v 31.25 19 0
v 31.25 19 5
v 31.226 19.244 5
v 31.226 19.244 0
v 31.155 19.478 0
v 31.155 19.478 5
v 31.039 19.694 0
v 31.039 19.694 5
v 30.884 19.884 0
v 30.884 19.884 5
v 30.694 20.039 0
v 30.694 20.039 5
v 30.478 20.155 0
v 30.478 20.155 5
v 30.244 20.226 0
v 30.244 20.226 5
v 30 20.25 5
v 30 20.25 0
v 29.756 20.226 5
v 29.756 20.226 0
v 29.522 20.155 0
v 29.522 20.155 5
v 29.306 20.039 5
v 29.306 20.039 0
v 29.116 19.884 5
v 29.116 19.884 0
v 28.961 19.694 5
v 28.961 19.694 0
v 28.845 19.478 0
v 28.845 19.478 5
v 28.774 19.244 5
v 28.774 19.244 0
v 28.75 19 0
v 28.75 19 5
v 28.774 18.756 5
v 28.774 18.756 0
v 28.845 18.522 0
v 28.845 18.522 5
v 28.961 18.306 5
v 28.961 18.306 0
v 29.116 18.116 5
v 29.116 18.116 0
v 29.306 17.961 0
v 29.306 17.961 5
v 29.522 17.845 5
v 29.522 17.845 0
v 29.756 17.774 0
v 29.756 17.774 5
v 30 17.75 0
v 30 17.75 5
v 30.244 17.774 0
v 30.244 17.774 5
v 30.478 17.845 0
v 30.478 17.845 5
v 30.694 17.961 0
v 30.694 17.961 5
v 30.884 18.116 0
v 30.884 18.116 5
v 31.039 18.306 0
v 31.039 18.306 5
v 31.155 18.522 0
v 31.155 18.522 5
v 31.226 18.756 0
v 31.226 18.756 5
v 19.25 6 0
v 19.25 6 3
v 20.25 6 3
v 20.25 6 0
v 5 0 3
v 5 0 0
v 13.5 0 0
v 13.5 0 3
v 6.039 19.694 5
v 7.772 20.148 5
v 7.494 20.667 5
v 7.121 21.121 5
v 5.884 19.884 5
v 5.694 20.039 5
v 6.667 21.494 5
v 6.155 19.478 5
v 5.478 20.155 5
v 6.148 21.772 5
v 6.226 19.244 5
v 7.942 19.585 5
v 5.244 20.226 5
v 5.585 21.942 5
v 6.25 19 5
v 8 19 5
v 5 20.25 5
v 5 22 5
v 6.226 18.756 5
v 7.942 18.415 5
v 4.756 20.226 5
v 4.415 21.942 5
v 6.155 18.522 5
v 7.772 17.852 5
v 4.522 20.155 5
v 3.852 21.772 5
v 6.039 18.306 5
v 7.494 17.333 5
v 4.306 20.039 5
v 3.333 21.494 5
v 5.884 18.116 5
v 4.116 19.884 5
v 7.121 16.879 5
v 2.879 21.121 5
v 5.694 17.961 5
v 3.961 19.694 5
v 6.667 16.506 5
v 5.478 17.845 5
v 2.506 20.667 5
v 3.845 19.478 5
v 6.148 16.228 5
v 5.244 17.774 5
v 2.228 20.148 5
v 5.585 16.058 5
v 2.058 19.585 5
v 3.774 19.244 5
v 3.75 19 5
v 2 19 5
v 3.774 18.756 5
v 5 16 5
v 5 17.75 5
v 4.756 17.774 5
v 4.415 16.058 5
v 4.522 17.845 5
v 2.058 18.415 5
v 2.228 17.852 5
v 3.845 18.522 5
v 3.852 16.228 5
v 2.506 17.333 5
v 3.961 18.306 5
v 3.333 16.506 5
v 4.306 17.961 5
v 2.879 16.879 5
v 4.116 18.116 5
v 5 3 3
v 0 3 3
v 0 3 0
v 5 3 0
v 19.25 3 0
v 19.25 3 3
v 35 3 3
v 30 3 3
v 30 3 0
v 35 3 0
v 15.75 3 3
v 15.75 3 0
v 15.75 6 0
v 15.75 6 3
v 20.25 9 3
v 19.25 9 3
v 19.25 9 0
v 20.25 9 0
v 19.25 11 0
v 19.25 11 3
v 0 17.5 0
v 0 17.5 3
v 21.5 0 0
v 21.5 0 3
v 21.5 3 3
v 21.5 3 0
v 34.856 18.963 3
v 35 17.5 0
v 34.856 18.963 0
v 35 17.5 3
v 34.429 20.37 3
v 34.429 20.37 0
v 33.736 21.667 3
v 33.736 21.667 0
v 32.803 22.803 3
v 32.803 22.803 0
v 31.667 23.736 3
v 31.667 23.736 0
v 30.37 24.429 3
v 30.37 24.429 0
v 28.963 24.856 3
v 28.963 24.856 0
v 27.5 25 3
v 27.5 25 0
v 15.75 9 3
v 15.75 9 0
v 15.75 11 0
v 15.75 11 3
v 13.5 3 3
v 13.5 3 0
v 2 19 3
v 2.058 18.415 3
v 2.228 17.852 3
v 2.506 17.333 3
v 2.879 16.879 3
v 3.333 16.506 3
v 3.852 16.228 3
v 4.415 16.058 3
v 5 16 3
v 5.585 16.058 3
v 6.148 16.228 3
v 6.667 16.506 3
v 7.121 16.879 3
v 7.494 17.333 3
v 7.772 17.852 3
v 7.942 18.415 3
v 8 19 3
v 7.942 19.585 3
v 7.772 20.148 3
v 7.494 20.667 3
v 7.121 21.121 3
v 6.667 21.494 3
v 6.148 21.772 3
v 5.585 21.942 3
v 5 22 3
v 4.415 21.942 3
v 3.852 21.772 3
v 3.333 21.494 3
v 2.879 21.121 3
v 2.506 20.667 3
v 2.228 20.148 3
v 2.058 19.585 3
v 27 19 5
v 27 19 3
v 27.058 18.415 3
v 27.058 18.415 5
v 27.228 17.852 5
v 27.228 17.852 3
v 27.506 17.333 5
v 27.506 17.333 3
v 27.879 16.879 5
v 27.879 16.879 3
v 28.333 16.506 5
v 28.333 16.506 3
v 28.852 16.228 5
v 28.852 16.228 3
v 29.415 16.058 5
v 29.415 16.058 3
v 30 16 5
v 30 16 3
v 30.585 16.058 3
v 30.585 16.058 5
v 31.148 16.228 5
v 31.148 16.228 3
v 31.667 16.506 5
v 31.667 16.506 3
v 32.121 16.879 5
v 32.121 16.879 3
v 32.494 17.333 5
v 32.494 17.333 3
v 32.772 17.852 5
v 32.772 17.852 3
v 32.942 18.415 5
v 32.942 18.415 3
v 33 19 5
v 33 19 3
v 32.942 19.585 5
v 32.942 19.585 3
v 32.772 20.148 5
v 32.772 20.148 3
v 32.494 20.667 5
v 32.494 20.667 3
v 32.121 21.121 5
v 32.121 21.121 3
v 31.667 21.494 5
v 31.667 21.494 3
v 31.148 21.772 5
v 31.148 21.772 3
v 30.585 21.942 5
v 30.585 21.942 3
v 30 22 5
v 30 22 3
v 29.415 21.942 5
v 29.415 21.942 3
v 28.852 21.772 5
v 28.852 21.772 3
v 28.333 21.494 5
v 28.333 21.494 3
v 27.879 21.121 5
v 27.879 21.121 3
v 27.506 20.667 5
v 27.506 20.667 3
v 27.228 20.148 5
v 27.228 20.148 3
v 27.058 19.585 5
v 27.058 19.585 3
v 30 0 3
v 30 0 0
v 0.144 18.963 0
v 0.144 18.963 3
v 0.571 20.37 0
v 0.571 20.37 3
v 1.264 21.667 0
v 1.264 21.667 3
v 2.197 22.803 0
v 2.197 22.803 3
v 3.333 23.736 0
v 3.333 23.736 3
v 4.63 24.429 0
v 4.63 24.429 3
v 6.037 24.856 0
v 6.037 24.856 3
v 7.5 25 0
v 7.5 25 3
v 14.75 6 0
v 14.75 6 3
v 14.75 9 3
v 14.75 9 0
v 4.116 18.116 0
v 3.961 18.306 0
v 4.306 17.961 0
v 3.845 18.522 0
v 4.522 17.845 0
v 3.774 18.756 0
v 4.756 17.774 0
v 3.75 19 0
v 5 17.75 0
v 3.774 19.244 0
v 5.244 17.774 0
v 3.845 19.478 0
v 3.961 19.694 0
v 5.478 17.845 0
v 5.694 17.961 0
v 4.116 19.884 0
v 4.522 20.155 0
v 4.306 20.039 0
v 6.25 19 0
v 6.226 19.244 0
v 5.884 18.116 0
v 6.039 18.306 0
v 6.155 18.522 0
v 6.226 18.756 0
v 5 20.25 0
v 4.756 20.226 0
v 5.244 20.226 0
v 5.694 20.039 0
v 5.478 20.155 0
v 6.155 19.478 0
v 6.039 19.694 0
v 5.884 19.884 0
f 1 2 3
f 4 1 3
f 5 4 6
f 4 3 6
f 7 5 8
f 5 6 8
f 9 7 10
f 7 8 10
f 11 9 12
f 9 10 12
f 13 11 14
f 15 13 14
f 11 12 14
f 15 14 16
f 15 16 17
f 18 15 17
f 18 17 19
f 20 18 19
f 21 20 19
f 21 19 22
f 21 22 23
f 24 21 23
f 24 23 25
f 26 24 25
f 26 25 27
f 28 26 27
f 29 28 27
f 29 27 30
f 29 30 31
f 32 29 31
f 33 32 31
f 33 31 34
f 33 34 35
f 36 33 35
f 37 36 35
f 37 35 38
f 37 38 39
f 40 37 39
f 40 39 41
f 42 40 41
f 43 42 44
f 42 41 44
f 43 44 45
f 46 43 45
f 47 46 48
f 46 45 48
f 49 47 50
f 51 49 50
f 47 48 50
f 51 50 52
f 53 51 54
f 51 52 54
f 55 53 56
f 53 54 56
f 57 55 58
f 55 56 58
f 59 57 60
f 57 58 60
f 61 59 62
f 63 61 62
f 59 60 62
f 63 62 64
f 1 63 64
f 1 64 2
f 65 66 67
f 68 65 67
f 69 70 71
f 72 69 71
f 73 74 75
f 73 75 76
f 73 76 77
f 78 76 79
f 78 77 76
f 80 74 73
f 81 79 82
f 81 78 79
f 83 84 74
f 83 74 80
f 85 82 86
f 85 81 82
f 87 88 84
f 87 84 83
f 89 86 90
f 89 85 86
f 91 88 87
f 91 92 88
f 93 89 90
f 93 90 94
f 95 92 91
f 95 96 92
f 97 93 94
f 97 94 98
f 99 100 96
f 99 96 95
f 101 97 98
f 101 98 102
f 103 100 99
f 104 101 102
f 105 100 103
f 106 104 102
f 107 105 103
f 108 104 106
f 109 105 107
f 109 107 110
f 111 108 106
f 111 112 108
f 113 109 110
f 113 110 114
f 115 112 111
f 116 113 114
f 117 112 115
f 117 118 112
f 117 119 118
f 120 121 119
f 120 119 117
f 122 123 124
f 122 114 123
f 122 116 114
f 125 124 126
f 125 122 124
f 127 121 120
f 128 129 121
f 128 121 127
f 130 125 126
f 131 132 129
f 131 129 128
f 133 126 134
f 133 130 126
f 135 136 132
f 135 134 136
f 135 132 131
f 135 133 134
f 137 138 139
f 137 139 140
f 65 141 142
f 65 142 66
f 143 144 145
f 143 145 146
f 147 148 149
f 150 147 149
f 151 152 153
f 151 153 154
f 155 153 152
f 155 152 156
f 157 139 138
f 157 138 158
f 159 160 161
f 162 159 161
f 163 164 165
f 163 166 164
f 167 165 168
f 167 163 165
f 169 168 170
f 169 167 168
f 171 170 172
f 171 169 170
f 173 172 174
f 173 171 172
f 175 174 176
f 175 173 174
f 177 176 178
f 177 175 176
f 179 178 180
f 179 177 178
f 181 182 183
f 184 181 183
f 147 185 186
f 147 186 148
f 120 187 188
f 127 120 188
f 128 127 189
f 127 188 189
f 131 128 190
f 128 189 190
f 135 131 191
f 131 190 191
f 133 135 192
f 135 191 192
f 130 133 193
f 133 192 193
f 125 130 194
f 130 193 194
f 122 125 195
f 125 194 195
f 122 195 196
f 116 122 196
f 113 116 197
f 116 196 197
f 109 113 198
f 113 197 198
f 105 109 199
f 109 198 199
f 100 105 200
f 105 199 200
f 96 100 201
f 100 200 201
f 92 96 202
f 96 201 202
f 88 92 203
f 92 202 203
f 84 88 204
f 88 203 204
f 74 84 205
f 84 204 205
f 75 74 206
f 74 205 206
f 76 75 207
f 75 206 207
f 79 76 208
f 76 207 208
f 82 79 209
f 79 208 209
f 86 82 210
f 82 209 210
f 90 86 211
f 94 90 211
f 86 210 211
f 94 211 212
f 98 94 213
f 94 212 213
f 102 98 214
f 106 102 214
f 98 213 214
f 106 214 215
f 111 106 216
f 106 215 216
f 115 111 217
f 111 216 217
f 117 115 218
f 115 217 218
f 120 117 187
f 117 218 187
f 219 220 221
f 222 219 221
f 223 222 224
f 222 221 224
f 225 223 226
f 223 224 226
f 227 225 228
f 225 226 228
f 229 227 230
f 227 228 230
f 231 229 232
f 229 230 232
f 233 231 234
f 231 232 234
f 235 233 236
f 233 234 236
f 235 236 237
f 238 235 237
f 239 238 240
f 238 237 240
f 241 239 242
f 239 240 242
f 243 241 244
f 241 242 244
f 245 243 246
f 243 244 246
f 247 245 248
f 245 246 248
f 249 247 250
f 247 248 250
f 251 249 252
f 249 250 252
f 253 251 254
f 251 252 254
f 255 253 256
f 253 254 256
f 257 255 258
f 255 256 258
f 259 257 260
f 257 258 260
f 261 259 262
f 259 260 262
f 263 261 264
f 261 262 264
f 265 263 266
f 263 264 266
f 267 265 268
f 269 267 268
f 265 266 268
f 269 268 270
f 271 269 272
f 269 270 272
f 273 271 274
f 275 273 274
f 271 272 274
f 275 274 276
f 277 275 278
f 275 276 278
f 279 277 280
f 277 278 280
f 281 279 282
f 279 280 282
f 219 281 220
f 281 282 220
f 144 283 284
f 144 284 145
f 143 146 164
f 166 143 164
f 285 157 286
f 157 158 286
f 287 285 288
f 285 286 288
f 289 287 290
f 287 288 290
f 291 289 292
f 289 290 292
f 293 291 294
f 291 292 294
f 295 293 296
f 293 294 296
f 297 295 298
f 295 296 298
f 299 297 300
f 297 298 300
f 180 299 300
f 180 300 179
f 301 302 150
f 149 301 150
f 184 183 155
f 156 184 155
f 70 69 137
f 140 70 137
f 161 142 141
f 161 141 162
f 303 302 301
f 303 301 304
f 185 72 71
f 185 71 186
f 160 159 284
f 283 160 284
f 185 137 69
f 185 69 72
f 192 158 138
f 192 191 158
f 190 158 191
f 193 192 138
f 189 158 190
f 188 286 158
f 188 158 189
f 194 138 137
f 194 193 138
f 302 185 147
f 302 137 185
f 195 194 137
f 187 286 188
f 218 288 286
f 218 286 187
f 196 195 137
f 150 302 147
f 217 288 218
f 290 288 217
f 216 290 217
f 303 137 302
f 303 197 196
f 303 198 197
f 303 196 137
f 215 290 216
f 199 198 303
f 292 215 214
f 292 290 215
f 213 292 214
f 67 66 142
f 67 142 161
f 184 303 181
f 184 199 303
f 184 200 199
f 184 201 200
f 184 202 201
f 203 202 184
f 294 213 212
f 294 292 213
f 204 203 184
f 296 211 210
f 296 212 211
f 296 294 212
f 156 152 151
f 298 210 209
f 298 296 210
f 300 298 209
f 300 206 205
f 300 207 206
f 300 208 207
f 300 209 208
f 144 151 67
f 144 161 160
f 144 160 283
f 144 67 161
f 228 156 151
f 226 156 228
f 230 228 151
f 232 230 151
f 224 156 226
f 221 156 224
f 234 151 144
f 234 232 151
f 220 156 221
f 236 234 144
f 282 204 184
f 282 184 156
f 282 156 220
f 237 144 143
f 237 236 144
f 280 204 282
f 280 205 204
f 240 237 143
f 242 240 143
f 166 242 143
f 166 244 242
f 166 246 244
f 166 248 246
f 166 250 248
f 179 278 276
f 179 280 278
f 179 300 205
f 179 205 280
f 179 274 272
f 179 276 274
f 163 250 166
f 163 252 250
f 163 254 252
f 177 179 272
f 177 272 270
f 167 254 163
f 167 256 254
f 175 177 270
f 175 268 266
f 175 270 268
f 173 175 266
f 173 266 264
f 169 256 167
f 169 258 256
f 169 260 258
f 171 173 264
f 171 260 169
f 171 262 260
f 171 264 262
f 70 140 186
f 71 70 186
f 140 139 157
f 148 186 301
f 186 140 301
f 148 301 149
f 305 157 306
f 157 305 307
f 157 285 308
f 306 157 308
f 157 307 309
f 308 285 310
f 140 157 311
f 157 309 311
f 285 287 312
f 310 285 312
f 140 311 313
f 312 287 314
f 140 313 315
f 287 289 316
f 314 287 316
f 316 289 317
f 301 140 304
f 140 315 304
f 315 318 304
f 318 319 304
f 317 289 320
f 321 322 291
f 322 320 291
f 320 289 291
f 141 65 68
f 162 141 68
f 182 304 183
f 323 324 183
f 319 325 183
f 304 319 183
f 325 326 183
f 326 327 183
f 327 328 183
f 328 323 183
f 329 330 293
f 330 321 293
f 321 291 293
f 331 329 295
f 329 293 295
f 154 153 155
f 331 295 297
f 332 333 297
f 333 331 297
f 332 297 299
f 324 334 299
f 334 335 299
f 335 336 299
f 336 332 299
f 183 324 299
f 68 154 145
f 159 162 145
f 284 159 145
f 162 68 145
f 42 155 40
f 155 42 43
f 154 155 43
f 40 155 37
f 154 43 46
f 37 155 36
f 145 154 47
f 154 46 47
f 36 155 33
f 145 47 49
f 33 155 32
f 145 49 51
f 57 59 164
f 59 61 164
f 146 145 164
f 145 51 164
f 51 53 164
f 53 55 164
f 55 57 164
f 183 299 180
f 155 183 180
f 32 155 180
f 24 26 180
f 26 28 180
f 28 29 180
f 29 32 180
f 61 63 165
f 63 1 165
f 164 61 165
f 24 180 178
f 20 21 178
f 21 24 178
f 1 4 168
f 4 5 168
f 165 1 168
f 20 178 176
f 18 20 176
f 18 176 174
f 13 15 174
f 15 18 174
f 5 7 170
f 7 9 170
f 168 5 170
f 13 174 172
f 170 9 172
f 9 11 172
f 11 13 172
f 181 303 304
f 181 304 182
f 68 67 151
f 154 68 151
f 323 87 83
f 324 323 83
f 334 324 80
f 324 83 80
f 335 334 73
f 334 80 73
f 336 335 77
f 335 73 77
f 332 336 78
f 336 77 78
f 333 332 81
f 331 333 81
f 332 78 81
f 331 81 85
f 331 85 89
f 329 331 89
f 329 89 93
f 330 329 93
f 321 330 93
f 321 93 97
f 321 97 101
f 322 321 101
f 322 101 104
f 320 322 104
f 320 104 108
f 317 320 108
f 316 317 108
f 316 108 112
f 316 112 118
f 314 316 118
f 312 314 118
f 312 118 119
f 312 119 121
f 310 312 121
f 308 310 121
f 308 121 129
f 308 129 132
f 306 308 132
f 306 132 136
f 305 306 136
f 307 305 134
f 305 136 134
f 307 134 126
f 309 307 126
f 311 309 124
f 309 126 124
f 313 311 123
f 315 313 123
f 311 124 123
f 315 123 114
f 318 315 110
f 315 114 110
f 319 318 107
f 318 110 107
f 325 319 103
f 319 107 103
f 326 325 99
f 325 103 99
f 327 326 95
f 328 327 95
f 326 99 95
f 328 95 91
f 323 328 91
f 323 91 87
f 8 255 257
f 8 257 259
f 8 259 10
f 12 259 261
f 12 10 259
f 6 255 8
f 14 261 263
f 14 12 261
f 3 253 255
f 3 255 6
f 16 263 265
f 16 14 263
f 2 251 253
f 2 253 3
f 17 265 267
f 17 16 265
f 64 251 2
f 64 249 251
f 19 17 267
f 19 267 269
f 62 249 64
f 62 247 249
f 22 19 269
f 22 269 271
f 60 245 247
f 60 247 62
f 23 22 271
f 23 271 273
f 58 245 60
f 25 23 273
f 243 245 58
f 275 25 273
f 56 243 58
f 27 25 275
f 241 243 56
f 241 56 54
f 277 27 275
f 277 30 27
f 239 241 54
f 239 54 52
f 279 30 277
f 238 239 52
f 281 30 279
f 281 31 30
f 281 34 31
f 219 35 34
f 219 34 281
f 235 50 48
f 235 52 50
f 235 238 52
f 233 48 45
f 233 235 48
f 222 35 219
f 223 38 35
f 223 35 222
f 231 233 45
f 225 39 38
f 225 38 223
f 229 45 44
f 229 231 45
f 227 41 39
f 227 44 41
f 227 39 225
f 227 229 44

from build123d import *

# Parameters (mm, degrees)
ESQUISSE1_W              = 35
ESQUISSE1_H              = 25
BOSS_EXTRU_1_DEPTH       = 3
CONG_3_R                 = 7.5
ENL_V_MAT_EXTRU_2_REACH  = 45.116
ESQUISSE3_W              = 8
ESQUISSE3_H              = 3
ENL_V_MAT_EXTRU_3_REACH  = 45.116
ESQUISSE4_W              = 5.5
ESQUISSE4_H              = 3
ENL_V_START              = -3
ESQUISSE5_W              = 3.5
ESQUISSE5_H              = 11
ENL_V_MAT_EXTRU_4_DEPTH  = 3
ENL_V_MAT_EXTRU_7_REACH  = 45.116
ESQUISSE8_W              = 5
ESQUISSE8_H              = 3
ENL_V_MAT_EXTRU_8_REACH  = 45.116
ESQUISSE9_W              = 5
ESQUISSE9_H              = 3
ESQUISSE12_R             = 3
BOSS_EXTRU_2_DEPTH       = 2
ESQUISSE13_R             = 3
BOSS_EXTRU_4_DEPTH       = 2
ENL_V_MAT_EXTRU_11_REACH = 45.301
ESQUISSE14_R             = 1.25
ENL_V_MAT_EXTRU_12_REACH = 45.301
ESQUISSE15_R             = 1.25


with BuildPart() as part:
    # Esquisse1 → Boss.-Extru.1 (new body)
    with BuildSketch(Plane.XY):
        with Locations((17.5, 12.5)):
            Rectangle(ESQUISSE1_W, ESQUISSE1_H)
    extrude(amount=BOSS_EXTRU_1_DEPTH)

    # Congé3
    cong_3_edges = [part.edges().sort_by_distance(p)[0] for p in [
        (0, 25, 1.5),
        (35, 25, 1.5),
    ]]
    fillet(cong_3_edges, radius=CONG_3_R)

    # Esquisse3 → Enlèv. mat.-Extru.2 (cut, up to next)
    with BuildSketch(Plane.XY.offset(3), mode=Mode.PRIVATE) as enl_v_mat_extru_2_sk1:
        with Locations((17.5, 1.5)):
            Rectangle(ESQUISSE3_W, ESQUISSE3_H)
    enl_v_mat_extru_2_tool1 = extrude(enl_v_mat_extru_2_sk1.sketch, amount=-ENL_V_MAT_EXTRU_2_REACH, mode=Mode.PRIVATE) & part.part
    add(enl_v_mat_extru_2_tool1.solids().sort_by_distance((17.5, 1.5, 3))[0], mode=Mode.SUBTRACT)

    # Esquisse4 → Enlèv. mat.-Extru.3 (cut, up to next)
    with BuildSketch(Plane.XY.offset(3), mode=Mode.PRIVATE) as enl_v_mat_extru_3_sk1:
        with Locations((17.5, 7.5)):
            Rectangle(ESQUISSE4_W, ESQUISSE4_H)
    enl_v_mat_extru_3_tool1 = extrude(enl_v_mat_extru_3_sk1.sketch, amount=-ENL_V_MAT_EXTRU_3_REACH, mode=Mode.PRIVATE) & part.part
    add(enl_v_mat_extru_3_tool1.solids().sort_by_distance((17.5, 7.5, 3))[0], mode=Mode.SUBTRACT)

    # Esquisse5 → Enlèv. mat.-Extru.4 (cut)
    with BuildSketch(Plane.XY.offset(3).offset(ENL_V_START)):
        with Locations((17.5, 5.5)):
            Rectangle(ESQUISSE5_W, ESQUISSE5_H)
    extrude(amount=ENL_V_MAT_EXTRU_4_DEPTH, mode=Mode.SUBTRACT)

    # Esquisse8 → Enlèv. mat.-Extru.7 (cut, up to next)
    with BuildSketch(Plane.XY.offset(3), mode=Mode.PRIVATE) as enl_v_mat_extru_7_sk1:
        with Locations((2.5, 1.5)):
            Rectangle(ESQUISSE8_W, ESQUISSE8_H)
    enl_v_mat_extru_7_tool1 = extrude(enl_v_mat_extru_7_sk1.sketch, amount=-ENL_V_MAT_EXTRU_7_REACH, mode=Mode.PRIVATE) & part.part
    add(enl_v_mat_extru_7_tool1.solids().sort_by_distance((2.5, 1.5, 3))[0], mode=Mode.SUBTRACT)

    # Esquisse9 → Enlèv. mat.-Extru.8 (cut, up to next)
    with BuildSketch(Plane.XY.offset(3), mode=Mode.PRIVATE) as enl_v_mat_extru_8_sk1:
        with Locations((32.5, 1.5)):
            Rectangle(ESQUISSE9_W, ESQUISSE9_H)
    enl_v_mat_extru_8_tool1 = extrude(enl_v_mat_extru_8_sk1.sketch, amount=-ENL_V_MAT_EXTRU_8_REACH, mode=Mode.PRIVATE) & part.part
    add(enl_v_mat_extru_8_tool1.solids().sort_by_distance((32.5, 1.5, 3))[0], mode=Mode.SUBTRACT)

    # Esquisse12 → Boss.-Extru.2 (add)
    with BuildSketch(Plane.XY.offset(3)):
        with Locations(Location((30, 19, 0), (0, 0, 180))):
            Circle(ESQUISSE12_R)
    extrude(amount=BOSS_EXTRU_2_DEPTH)

    # Esquisse13 → Boss.-Extru.4 (add)
    with BuildSketch(Plane.XY.offset(3)):
        with Locations(Location((5, 19, 0), (0, 0, 180))):
            Circle(ESQUISSE13_R)
    extrude(amount=BOSS_EXTRU_4_DEPTH)

    # Esquisse14 → Enlèv. mat.-Extru.11 (cut, up to next)
    with BuildSketch(Plane.XY.offset(5), mode=Mode.PRIVATE) as enl_v_mat_extru_11_sk1:
        with Locations((5, 19)):
            Circle(ESQUISSE14_R)
    enl_v_mat_extru_11_tool1 = extrude(enl_v_mat_extru_11_sk1.sketch, amount=-ENL_V_MAT_EXTRU_11_REACH, mode=Mode.PRIVATE) & part.part
    add(enl_v_mat_extru_11_tool1.solids().sort_by_distance((5, 19, 5))[0], mode=Mode.SUBTRACT)

    # Esquisse15 → Enlèv. mat.-Extru.12 (cut, up to next)
    with BuildSketch(Plane.XY.offset(5), mode=Mode.PRIVATE) as enl_v_mat_extru_12_sk1:
        with Locations((30, 19)):
            Circle(ESQUISSE15_R)
    enl_v_mat_extru_12_tool1 = extrude(enl_v_mat_extru_12_sk1.sketch, amount=-ENL_V_MAT_EXTRU_12_REACH, mode=Mode.PRIVATE) & part.part
    add(enl_v_mat_extru_12_tool1.solids().sort_by_distance((30, 19, 5))[0], mode=Mode.SUBTRACT)


solid = part.part
